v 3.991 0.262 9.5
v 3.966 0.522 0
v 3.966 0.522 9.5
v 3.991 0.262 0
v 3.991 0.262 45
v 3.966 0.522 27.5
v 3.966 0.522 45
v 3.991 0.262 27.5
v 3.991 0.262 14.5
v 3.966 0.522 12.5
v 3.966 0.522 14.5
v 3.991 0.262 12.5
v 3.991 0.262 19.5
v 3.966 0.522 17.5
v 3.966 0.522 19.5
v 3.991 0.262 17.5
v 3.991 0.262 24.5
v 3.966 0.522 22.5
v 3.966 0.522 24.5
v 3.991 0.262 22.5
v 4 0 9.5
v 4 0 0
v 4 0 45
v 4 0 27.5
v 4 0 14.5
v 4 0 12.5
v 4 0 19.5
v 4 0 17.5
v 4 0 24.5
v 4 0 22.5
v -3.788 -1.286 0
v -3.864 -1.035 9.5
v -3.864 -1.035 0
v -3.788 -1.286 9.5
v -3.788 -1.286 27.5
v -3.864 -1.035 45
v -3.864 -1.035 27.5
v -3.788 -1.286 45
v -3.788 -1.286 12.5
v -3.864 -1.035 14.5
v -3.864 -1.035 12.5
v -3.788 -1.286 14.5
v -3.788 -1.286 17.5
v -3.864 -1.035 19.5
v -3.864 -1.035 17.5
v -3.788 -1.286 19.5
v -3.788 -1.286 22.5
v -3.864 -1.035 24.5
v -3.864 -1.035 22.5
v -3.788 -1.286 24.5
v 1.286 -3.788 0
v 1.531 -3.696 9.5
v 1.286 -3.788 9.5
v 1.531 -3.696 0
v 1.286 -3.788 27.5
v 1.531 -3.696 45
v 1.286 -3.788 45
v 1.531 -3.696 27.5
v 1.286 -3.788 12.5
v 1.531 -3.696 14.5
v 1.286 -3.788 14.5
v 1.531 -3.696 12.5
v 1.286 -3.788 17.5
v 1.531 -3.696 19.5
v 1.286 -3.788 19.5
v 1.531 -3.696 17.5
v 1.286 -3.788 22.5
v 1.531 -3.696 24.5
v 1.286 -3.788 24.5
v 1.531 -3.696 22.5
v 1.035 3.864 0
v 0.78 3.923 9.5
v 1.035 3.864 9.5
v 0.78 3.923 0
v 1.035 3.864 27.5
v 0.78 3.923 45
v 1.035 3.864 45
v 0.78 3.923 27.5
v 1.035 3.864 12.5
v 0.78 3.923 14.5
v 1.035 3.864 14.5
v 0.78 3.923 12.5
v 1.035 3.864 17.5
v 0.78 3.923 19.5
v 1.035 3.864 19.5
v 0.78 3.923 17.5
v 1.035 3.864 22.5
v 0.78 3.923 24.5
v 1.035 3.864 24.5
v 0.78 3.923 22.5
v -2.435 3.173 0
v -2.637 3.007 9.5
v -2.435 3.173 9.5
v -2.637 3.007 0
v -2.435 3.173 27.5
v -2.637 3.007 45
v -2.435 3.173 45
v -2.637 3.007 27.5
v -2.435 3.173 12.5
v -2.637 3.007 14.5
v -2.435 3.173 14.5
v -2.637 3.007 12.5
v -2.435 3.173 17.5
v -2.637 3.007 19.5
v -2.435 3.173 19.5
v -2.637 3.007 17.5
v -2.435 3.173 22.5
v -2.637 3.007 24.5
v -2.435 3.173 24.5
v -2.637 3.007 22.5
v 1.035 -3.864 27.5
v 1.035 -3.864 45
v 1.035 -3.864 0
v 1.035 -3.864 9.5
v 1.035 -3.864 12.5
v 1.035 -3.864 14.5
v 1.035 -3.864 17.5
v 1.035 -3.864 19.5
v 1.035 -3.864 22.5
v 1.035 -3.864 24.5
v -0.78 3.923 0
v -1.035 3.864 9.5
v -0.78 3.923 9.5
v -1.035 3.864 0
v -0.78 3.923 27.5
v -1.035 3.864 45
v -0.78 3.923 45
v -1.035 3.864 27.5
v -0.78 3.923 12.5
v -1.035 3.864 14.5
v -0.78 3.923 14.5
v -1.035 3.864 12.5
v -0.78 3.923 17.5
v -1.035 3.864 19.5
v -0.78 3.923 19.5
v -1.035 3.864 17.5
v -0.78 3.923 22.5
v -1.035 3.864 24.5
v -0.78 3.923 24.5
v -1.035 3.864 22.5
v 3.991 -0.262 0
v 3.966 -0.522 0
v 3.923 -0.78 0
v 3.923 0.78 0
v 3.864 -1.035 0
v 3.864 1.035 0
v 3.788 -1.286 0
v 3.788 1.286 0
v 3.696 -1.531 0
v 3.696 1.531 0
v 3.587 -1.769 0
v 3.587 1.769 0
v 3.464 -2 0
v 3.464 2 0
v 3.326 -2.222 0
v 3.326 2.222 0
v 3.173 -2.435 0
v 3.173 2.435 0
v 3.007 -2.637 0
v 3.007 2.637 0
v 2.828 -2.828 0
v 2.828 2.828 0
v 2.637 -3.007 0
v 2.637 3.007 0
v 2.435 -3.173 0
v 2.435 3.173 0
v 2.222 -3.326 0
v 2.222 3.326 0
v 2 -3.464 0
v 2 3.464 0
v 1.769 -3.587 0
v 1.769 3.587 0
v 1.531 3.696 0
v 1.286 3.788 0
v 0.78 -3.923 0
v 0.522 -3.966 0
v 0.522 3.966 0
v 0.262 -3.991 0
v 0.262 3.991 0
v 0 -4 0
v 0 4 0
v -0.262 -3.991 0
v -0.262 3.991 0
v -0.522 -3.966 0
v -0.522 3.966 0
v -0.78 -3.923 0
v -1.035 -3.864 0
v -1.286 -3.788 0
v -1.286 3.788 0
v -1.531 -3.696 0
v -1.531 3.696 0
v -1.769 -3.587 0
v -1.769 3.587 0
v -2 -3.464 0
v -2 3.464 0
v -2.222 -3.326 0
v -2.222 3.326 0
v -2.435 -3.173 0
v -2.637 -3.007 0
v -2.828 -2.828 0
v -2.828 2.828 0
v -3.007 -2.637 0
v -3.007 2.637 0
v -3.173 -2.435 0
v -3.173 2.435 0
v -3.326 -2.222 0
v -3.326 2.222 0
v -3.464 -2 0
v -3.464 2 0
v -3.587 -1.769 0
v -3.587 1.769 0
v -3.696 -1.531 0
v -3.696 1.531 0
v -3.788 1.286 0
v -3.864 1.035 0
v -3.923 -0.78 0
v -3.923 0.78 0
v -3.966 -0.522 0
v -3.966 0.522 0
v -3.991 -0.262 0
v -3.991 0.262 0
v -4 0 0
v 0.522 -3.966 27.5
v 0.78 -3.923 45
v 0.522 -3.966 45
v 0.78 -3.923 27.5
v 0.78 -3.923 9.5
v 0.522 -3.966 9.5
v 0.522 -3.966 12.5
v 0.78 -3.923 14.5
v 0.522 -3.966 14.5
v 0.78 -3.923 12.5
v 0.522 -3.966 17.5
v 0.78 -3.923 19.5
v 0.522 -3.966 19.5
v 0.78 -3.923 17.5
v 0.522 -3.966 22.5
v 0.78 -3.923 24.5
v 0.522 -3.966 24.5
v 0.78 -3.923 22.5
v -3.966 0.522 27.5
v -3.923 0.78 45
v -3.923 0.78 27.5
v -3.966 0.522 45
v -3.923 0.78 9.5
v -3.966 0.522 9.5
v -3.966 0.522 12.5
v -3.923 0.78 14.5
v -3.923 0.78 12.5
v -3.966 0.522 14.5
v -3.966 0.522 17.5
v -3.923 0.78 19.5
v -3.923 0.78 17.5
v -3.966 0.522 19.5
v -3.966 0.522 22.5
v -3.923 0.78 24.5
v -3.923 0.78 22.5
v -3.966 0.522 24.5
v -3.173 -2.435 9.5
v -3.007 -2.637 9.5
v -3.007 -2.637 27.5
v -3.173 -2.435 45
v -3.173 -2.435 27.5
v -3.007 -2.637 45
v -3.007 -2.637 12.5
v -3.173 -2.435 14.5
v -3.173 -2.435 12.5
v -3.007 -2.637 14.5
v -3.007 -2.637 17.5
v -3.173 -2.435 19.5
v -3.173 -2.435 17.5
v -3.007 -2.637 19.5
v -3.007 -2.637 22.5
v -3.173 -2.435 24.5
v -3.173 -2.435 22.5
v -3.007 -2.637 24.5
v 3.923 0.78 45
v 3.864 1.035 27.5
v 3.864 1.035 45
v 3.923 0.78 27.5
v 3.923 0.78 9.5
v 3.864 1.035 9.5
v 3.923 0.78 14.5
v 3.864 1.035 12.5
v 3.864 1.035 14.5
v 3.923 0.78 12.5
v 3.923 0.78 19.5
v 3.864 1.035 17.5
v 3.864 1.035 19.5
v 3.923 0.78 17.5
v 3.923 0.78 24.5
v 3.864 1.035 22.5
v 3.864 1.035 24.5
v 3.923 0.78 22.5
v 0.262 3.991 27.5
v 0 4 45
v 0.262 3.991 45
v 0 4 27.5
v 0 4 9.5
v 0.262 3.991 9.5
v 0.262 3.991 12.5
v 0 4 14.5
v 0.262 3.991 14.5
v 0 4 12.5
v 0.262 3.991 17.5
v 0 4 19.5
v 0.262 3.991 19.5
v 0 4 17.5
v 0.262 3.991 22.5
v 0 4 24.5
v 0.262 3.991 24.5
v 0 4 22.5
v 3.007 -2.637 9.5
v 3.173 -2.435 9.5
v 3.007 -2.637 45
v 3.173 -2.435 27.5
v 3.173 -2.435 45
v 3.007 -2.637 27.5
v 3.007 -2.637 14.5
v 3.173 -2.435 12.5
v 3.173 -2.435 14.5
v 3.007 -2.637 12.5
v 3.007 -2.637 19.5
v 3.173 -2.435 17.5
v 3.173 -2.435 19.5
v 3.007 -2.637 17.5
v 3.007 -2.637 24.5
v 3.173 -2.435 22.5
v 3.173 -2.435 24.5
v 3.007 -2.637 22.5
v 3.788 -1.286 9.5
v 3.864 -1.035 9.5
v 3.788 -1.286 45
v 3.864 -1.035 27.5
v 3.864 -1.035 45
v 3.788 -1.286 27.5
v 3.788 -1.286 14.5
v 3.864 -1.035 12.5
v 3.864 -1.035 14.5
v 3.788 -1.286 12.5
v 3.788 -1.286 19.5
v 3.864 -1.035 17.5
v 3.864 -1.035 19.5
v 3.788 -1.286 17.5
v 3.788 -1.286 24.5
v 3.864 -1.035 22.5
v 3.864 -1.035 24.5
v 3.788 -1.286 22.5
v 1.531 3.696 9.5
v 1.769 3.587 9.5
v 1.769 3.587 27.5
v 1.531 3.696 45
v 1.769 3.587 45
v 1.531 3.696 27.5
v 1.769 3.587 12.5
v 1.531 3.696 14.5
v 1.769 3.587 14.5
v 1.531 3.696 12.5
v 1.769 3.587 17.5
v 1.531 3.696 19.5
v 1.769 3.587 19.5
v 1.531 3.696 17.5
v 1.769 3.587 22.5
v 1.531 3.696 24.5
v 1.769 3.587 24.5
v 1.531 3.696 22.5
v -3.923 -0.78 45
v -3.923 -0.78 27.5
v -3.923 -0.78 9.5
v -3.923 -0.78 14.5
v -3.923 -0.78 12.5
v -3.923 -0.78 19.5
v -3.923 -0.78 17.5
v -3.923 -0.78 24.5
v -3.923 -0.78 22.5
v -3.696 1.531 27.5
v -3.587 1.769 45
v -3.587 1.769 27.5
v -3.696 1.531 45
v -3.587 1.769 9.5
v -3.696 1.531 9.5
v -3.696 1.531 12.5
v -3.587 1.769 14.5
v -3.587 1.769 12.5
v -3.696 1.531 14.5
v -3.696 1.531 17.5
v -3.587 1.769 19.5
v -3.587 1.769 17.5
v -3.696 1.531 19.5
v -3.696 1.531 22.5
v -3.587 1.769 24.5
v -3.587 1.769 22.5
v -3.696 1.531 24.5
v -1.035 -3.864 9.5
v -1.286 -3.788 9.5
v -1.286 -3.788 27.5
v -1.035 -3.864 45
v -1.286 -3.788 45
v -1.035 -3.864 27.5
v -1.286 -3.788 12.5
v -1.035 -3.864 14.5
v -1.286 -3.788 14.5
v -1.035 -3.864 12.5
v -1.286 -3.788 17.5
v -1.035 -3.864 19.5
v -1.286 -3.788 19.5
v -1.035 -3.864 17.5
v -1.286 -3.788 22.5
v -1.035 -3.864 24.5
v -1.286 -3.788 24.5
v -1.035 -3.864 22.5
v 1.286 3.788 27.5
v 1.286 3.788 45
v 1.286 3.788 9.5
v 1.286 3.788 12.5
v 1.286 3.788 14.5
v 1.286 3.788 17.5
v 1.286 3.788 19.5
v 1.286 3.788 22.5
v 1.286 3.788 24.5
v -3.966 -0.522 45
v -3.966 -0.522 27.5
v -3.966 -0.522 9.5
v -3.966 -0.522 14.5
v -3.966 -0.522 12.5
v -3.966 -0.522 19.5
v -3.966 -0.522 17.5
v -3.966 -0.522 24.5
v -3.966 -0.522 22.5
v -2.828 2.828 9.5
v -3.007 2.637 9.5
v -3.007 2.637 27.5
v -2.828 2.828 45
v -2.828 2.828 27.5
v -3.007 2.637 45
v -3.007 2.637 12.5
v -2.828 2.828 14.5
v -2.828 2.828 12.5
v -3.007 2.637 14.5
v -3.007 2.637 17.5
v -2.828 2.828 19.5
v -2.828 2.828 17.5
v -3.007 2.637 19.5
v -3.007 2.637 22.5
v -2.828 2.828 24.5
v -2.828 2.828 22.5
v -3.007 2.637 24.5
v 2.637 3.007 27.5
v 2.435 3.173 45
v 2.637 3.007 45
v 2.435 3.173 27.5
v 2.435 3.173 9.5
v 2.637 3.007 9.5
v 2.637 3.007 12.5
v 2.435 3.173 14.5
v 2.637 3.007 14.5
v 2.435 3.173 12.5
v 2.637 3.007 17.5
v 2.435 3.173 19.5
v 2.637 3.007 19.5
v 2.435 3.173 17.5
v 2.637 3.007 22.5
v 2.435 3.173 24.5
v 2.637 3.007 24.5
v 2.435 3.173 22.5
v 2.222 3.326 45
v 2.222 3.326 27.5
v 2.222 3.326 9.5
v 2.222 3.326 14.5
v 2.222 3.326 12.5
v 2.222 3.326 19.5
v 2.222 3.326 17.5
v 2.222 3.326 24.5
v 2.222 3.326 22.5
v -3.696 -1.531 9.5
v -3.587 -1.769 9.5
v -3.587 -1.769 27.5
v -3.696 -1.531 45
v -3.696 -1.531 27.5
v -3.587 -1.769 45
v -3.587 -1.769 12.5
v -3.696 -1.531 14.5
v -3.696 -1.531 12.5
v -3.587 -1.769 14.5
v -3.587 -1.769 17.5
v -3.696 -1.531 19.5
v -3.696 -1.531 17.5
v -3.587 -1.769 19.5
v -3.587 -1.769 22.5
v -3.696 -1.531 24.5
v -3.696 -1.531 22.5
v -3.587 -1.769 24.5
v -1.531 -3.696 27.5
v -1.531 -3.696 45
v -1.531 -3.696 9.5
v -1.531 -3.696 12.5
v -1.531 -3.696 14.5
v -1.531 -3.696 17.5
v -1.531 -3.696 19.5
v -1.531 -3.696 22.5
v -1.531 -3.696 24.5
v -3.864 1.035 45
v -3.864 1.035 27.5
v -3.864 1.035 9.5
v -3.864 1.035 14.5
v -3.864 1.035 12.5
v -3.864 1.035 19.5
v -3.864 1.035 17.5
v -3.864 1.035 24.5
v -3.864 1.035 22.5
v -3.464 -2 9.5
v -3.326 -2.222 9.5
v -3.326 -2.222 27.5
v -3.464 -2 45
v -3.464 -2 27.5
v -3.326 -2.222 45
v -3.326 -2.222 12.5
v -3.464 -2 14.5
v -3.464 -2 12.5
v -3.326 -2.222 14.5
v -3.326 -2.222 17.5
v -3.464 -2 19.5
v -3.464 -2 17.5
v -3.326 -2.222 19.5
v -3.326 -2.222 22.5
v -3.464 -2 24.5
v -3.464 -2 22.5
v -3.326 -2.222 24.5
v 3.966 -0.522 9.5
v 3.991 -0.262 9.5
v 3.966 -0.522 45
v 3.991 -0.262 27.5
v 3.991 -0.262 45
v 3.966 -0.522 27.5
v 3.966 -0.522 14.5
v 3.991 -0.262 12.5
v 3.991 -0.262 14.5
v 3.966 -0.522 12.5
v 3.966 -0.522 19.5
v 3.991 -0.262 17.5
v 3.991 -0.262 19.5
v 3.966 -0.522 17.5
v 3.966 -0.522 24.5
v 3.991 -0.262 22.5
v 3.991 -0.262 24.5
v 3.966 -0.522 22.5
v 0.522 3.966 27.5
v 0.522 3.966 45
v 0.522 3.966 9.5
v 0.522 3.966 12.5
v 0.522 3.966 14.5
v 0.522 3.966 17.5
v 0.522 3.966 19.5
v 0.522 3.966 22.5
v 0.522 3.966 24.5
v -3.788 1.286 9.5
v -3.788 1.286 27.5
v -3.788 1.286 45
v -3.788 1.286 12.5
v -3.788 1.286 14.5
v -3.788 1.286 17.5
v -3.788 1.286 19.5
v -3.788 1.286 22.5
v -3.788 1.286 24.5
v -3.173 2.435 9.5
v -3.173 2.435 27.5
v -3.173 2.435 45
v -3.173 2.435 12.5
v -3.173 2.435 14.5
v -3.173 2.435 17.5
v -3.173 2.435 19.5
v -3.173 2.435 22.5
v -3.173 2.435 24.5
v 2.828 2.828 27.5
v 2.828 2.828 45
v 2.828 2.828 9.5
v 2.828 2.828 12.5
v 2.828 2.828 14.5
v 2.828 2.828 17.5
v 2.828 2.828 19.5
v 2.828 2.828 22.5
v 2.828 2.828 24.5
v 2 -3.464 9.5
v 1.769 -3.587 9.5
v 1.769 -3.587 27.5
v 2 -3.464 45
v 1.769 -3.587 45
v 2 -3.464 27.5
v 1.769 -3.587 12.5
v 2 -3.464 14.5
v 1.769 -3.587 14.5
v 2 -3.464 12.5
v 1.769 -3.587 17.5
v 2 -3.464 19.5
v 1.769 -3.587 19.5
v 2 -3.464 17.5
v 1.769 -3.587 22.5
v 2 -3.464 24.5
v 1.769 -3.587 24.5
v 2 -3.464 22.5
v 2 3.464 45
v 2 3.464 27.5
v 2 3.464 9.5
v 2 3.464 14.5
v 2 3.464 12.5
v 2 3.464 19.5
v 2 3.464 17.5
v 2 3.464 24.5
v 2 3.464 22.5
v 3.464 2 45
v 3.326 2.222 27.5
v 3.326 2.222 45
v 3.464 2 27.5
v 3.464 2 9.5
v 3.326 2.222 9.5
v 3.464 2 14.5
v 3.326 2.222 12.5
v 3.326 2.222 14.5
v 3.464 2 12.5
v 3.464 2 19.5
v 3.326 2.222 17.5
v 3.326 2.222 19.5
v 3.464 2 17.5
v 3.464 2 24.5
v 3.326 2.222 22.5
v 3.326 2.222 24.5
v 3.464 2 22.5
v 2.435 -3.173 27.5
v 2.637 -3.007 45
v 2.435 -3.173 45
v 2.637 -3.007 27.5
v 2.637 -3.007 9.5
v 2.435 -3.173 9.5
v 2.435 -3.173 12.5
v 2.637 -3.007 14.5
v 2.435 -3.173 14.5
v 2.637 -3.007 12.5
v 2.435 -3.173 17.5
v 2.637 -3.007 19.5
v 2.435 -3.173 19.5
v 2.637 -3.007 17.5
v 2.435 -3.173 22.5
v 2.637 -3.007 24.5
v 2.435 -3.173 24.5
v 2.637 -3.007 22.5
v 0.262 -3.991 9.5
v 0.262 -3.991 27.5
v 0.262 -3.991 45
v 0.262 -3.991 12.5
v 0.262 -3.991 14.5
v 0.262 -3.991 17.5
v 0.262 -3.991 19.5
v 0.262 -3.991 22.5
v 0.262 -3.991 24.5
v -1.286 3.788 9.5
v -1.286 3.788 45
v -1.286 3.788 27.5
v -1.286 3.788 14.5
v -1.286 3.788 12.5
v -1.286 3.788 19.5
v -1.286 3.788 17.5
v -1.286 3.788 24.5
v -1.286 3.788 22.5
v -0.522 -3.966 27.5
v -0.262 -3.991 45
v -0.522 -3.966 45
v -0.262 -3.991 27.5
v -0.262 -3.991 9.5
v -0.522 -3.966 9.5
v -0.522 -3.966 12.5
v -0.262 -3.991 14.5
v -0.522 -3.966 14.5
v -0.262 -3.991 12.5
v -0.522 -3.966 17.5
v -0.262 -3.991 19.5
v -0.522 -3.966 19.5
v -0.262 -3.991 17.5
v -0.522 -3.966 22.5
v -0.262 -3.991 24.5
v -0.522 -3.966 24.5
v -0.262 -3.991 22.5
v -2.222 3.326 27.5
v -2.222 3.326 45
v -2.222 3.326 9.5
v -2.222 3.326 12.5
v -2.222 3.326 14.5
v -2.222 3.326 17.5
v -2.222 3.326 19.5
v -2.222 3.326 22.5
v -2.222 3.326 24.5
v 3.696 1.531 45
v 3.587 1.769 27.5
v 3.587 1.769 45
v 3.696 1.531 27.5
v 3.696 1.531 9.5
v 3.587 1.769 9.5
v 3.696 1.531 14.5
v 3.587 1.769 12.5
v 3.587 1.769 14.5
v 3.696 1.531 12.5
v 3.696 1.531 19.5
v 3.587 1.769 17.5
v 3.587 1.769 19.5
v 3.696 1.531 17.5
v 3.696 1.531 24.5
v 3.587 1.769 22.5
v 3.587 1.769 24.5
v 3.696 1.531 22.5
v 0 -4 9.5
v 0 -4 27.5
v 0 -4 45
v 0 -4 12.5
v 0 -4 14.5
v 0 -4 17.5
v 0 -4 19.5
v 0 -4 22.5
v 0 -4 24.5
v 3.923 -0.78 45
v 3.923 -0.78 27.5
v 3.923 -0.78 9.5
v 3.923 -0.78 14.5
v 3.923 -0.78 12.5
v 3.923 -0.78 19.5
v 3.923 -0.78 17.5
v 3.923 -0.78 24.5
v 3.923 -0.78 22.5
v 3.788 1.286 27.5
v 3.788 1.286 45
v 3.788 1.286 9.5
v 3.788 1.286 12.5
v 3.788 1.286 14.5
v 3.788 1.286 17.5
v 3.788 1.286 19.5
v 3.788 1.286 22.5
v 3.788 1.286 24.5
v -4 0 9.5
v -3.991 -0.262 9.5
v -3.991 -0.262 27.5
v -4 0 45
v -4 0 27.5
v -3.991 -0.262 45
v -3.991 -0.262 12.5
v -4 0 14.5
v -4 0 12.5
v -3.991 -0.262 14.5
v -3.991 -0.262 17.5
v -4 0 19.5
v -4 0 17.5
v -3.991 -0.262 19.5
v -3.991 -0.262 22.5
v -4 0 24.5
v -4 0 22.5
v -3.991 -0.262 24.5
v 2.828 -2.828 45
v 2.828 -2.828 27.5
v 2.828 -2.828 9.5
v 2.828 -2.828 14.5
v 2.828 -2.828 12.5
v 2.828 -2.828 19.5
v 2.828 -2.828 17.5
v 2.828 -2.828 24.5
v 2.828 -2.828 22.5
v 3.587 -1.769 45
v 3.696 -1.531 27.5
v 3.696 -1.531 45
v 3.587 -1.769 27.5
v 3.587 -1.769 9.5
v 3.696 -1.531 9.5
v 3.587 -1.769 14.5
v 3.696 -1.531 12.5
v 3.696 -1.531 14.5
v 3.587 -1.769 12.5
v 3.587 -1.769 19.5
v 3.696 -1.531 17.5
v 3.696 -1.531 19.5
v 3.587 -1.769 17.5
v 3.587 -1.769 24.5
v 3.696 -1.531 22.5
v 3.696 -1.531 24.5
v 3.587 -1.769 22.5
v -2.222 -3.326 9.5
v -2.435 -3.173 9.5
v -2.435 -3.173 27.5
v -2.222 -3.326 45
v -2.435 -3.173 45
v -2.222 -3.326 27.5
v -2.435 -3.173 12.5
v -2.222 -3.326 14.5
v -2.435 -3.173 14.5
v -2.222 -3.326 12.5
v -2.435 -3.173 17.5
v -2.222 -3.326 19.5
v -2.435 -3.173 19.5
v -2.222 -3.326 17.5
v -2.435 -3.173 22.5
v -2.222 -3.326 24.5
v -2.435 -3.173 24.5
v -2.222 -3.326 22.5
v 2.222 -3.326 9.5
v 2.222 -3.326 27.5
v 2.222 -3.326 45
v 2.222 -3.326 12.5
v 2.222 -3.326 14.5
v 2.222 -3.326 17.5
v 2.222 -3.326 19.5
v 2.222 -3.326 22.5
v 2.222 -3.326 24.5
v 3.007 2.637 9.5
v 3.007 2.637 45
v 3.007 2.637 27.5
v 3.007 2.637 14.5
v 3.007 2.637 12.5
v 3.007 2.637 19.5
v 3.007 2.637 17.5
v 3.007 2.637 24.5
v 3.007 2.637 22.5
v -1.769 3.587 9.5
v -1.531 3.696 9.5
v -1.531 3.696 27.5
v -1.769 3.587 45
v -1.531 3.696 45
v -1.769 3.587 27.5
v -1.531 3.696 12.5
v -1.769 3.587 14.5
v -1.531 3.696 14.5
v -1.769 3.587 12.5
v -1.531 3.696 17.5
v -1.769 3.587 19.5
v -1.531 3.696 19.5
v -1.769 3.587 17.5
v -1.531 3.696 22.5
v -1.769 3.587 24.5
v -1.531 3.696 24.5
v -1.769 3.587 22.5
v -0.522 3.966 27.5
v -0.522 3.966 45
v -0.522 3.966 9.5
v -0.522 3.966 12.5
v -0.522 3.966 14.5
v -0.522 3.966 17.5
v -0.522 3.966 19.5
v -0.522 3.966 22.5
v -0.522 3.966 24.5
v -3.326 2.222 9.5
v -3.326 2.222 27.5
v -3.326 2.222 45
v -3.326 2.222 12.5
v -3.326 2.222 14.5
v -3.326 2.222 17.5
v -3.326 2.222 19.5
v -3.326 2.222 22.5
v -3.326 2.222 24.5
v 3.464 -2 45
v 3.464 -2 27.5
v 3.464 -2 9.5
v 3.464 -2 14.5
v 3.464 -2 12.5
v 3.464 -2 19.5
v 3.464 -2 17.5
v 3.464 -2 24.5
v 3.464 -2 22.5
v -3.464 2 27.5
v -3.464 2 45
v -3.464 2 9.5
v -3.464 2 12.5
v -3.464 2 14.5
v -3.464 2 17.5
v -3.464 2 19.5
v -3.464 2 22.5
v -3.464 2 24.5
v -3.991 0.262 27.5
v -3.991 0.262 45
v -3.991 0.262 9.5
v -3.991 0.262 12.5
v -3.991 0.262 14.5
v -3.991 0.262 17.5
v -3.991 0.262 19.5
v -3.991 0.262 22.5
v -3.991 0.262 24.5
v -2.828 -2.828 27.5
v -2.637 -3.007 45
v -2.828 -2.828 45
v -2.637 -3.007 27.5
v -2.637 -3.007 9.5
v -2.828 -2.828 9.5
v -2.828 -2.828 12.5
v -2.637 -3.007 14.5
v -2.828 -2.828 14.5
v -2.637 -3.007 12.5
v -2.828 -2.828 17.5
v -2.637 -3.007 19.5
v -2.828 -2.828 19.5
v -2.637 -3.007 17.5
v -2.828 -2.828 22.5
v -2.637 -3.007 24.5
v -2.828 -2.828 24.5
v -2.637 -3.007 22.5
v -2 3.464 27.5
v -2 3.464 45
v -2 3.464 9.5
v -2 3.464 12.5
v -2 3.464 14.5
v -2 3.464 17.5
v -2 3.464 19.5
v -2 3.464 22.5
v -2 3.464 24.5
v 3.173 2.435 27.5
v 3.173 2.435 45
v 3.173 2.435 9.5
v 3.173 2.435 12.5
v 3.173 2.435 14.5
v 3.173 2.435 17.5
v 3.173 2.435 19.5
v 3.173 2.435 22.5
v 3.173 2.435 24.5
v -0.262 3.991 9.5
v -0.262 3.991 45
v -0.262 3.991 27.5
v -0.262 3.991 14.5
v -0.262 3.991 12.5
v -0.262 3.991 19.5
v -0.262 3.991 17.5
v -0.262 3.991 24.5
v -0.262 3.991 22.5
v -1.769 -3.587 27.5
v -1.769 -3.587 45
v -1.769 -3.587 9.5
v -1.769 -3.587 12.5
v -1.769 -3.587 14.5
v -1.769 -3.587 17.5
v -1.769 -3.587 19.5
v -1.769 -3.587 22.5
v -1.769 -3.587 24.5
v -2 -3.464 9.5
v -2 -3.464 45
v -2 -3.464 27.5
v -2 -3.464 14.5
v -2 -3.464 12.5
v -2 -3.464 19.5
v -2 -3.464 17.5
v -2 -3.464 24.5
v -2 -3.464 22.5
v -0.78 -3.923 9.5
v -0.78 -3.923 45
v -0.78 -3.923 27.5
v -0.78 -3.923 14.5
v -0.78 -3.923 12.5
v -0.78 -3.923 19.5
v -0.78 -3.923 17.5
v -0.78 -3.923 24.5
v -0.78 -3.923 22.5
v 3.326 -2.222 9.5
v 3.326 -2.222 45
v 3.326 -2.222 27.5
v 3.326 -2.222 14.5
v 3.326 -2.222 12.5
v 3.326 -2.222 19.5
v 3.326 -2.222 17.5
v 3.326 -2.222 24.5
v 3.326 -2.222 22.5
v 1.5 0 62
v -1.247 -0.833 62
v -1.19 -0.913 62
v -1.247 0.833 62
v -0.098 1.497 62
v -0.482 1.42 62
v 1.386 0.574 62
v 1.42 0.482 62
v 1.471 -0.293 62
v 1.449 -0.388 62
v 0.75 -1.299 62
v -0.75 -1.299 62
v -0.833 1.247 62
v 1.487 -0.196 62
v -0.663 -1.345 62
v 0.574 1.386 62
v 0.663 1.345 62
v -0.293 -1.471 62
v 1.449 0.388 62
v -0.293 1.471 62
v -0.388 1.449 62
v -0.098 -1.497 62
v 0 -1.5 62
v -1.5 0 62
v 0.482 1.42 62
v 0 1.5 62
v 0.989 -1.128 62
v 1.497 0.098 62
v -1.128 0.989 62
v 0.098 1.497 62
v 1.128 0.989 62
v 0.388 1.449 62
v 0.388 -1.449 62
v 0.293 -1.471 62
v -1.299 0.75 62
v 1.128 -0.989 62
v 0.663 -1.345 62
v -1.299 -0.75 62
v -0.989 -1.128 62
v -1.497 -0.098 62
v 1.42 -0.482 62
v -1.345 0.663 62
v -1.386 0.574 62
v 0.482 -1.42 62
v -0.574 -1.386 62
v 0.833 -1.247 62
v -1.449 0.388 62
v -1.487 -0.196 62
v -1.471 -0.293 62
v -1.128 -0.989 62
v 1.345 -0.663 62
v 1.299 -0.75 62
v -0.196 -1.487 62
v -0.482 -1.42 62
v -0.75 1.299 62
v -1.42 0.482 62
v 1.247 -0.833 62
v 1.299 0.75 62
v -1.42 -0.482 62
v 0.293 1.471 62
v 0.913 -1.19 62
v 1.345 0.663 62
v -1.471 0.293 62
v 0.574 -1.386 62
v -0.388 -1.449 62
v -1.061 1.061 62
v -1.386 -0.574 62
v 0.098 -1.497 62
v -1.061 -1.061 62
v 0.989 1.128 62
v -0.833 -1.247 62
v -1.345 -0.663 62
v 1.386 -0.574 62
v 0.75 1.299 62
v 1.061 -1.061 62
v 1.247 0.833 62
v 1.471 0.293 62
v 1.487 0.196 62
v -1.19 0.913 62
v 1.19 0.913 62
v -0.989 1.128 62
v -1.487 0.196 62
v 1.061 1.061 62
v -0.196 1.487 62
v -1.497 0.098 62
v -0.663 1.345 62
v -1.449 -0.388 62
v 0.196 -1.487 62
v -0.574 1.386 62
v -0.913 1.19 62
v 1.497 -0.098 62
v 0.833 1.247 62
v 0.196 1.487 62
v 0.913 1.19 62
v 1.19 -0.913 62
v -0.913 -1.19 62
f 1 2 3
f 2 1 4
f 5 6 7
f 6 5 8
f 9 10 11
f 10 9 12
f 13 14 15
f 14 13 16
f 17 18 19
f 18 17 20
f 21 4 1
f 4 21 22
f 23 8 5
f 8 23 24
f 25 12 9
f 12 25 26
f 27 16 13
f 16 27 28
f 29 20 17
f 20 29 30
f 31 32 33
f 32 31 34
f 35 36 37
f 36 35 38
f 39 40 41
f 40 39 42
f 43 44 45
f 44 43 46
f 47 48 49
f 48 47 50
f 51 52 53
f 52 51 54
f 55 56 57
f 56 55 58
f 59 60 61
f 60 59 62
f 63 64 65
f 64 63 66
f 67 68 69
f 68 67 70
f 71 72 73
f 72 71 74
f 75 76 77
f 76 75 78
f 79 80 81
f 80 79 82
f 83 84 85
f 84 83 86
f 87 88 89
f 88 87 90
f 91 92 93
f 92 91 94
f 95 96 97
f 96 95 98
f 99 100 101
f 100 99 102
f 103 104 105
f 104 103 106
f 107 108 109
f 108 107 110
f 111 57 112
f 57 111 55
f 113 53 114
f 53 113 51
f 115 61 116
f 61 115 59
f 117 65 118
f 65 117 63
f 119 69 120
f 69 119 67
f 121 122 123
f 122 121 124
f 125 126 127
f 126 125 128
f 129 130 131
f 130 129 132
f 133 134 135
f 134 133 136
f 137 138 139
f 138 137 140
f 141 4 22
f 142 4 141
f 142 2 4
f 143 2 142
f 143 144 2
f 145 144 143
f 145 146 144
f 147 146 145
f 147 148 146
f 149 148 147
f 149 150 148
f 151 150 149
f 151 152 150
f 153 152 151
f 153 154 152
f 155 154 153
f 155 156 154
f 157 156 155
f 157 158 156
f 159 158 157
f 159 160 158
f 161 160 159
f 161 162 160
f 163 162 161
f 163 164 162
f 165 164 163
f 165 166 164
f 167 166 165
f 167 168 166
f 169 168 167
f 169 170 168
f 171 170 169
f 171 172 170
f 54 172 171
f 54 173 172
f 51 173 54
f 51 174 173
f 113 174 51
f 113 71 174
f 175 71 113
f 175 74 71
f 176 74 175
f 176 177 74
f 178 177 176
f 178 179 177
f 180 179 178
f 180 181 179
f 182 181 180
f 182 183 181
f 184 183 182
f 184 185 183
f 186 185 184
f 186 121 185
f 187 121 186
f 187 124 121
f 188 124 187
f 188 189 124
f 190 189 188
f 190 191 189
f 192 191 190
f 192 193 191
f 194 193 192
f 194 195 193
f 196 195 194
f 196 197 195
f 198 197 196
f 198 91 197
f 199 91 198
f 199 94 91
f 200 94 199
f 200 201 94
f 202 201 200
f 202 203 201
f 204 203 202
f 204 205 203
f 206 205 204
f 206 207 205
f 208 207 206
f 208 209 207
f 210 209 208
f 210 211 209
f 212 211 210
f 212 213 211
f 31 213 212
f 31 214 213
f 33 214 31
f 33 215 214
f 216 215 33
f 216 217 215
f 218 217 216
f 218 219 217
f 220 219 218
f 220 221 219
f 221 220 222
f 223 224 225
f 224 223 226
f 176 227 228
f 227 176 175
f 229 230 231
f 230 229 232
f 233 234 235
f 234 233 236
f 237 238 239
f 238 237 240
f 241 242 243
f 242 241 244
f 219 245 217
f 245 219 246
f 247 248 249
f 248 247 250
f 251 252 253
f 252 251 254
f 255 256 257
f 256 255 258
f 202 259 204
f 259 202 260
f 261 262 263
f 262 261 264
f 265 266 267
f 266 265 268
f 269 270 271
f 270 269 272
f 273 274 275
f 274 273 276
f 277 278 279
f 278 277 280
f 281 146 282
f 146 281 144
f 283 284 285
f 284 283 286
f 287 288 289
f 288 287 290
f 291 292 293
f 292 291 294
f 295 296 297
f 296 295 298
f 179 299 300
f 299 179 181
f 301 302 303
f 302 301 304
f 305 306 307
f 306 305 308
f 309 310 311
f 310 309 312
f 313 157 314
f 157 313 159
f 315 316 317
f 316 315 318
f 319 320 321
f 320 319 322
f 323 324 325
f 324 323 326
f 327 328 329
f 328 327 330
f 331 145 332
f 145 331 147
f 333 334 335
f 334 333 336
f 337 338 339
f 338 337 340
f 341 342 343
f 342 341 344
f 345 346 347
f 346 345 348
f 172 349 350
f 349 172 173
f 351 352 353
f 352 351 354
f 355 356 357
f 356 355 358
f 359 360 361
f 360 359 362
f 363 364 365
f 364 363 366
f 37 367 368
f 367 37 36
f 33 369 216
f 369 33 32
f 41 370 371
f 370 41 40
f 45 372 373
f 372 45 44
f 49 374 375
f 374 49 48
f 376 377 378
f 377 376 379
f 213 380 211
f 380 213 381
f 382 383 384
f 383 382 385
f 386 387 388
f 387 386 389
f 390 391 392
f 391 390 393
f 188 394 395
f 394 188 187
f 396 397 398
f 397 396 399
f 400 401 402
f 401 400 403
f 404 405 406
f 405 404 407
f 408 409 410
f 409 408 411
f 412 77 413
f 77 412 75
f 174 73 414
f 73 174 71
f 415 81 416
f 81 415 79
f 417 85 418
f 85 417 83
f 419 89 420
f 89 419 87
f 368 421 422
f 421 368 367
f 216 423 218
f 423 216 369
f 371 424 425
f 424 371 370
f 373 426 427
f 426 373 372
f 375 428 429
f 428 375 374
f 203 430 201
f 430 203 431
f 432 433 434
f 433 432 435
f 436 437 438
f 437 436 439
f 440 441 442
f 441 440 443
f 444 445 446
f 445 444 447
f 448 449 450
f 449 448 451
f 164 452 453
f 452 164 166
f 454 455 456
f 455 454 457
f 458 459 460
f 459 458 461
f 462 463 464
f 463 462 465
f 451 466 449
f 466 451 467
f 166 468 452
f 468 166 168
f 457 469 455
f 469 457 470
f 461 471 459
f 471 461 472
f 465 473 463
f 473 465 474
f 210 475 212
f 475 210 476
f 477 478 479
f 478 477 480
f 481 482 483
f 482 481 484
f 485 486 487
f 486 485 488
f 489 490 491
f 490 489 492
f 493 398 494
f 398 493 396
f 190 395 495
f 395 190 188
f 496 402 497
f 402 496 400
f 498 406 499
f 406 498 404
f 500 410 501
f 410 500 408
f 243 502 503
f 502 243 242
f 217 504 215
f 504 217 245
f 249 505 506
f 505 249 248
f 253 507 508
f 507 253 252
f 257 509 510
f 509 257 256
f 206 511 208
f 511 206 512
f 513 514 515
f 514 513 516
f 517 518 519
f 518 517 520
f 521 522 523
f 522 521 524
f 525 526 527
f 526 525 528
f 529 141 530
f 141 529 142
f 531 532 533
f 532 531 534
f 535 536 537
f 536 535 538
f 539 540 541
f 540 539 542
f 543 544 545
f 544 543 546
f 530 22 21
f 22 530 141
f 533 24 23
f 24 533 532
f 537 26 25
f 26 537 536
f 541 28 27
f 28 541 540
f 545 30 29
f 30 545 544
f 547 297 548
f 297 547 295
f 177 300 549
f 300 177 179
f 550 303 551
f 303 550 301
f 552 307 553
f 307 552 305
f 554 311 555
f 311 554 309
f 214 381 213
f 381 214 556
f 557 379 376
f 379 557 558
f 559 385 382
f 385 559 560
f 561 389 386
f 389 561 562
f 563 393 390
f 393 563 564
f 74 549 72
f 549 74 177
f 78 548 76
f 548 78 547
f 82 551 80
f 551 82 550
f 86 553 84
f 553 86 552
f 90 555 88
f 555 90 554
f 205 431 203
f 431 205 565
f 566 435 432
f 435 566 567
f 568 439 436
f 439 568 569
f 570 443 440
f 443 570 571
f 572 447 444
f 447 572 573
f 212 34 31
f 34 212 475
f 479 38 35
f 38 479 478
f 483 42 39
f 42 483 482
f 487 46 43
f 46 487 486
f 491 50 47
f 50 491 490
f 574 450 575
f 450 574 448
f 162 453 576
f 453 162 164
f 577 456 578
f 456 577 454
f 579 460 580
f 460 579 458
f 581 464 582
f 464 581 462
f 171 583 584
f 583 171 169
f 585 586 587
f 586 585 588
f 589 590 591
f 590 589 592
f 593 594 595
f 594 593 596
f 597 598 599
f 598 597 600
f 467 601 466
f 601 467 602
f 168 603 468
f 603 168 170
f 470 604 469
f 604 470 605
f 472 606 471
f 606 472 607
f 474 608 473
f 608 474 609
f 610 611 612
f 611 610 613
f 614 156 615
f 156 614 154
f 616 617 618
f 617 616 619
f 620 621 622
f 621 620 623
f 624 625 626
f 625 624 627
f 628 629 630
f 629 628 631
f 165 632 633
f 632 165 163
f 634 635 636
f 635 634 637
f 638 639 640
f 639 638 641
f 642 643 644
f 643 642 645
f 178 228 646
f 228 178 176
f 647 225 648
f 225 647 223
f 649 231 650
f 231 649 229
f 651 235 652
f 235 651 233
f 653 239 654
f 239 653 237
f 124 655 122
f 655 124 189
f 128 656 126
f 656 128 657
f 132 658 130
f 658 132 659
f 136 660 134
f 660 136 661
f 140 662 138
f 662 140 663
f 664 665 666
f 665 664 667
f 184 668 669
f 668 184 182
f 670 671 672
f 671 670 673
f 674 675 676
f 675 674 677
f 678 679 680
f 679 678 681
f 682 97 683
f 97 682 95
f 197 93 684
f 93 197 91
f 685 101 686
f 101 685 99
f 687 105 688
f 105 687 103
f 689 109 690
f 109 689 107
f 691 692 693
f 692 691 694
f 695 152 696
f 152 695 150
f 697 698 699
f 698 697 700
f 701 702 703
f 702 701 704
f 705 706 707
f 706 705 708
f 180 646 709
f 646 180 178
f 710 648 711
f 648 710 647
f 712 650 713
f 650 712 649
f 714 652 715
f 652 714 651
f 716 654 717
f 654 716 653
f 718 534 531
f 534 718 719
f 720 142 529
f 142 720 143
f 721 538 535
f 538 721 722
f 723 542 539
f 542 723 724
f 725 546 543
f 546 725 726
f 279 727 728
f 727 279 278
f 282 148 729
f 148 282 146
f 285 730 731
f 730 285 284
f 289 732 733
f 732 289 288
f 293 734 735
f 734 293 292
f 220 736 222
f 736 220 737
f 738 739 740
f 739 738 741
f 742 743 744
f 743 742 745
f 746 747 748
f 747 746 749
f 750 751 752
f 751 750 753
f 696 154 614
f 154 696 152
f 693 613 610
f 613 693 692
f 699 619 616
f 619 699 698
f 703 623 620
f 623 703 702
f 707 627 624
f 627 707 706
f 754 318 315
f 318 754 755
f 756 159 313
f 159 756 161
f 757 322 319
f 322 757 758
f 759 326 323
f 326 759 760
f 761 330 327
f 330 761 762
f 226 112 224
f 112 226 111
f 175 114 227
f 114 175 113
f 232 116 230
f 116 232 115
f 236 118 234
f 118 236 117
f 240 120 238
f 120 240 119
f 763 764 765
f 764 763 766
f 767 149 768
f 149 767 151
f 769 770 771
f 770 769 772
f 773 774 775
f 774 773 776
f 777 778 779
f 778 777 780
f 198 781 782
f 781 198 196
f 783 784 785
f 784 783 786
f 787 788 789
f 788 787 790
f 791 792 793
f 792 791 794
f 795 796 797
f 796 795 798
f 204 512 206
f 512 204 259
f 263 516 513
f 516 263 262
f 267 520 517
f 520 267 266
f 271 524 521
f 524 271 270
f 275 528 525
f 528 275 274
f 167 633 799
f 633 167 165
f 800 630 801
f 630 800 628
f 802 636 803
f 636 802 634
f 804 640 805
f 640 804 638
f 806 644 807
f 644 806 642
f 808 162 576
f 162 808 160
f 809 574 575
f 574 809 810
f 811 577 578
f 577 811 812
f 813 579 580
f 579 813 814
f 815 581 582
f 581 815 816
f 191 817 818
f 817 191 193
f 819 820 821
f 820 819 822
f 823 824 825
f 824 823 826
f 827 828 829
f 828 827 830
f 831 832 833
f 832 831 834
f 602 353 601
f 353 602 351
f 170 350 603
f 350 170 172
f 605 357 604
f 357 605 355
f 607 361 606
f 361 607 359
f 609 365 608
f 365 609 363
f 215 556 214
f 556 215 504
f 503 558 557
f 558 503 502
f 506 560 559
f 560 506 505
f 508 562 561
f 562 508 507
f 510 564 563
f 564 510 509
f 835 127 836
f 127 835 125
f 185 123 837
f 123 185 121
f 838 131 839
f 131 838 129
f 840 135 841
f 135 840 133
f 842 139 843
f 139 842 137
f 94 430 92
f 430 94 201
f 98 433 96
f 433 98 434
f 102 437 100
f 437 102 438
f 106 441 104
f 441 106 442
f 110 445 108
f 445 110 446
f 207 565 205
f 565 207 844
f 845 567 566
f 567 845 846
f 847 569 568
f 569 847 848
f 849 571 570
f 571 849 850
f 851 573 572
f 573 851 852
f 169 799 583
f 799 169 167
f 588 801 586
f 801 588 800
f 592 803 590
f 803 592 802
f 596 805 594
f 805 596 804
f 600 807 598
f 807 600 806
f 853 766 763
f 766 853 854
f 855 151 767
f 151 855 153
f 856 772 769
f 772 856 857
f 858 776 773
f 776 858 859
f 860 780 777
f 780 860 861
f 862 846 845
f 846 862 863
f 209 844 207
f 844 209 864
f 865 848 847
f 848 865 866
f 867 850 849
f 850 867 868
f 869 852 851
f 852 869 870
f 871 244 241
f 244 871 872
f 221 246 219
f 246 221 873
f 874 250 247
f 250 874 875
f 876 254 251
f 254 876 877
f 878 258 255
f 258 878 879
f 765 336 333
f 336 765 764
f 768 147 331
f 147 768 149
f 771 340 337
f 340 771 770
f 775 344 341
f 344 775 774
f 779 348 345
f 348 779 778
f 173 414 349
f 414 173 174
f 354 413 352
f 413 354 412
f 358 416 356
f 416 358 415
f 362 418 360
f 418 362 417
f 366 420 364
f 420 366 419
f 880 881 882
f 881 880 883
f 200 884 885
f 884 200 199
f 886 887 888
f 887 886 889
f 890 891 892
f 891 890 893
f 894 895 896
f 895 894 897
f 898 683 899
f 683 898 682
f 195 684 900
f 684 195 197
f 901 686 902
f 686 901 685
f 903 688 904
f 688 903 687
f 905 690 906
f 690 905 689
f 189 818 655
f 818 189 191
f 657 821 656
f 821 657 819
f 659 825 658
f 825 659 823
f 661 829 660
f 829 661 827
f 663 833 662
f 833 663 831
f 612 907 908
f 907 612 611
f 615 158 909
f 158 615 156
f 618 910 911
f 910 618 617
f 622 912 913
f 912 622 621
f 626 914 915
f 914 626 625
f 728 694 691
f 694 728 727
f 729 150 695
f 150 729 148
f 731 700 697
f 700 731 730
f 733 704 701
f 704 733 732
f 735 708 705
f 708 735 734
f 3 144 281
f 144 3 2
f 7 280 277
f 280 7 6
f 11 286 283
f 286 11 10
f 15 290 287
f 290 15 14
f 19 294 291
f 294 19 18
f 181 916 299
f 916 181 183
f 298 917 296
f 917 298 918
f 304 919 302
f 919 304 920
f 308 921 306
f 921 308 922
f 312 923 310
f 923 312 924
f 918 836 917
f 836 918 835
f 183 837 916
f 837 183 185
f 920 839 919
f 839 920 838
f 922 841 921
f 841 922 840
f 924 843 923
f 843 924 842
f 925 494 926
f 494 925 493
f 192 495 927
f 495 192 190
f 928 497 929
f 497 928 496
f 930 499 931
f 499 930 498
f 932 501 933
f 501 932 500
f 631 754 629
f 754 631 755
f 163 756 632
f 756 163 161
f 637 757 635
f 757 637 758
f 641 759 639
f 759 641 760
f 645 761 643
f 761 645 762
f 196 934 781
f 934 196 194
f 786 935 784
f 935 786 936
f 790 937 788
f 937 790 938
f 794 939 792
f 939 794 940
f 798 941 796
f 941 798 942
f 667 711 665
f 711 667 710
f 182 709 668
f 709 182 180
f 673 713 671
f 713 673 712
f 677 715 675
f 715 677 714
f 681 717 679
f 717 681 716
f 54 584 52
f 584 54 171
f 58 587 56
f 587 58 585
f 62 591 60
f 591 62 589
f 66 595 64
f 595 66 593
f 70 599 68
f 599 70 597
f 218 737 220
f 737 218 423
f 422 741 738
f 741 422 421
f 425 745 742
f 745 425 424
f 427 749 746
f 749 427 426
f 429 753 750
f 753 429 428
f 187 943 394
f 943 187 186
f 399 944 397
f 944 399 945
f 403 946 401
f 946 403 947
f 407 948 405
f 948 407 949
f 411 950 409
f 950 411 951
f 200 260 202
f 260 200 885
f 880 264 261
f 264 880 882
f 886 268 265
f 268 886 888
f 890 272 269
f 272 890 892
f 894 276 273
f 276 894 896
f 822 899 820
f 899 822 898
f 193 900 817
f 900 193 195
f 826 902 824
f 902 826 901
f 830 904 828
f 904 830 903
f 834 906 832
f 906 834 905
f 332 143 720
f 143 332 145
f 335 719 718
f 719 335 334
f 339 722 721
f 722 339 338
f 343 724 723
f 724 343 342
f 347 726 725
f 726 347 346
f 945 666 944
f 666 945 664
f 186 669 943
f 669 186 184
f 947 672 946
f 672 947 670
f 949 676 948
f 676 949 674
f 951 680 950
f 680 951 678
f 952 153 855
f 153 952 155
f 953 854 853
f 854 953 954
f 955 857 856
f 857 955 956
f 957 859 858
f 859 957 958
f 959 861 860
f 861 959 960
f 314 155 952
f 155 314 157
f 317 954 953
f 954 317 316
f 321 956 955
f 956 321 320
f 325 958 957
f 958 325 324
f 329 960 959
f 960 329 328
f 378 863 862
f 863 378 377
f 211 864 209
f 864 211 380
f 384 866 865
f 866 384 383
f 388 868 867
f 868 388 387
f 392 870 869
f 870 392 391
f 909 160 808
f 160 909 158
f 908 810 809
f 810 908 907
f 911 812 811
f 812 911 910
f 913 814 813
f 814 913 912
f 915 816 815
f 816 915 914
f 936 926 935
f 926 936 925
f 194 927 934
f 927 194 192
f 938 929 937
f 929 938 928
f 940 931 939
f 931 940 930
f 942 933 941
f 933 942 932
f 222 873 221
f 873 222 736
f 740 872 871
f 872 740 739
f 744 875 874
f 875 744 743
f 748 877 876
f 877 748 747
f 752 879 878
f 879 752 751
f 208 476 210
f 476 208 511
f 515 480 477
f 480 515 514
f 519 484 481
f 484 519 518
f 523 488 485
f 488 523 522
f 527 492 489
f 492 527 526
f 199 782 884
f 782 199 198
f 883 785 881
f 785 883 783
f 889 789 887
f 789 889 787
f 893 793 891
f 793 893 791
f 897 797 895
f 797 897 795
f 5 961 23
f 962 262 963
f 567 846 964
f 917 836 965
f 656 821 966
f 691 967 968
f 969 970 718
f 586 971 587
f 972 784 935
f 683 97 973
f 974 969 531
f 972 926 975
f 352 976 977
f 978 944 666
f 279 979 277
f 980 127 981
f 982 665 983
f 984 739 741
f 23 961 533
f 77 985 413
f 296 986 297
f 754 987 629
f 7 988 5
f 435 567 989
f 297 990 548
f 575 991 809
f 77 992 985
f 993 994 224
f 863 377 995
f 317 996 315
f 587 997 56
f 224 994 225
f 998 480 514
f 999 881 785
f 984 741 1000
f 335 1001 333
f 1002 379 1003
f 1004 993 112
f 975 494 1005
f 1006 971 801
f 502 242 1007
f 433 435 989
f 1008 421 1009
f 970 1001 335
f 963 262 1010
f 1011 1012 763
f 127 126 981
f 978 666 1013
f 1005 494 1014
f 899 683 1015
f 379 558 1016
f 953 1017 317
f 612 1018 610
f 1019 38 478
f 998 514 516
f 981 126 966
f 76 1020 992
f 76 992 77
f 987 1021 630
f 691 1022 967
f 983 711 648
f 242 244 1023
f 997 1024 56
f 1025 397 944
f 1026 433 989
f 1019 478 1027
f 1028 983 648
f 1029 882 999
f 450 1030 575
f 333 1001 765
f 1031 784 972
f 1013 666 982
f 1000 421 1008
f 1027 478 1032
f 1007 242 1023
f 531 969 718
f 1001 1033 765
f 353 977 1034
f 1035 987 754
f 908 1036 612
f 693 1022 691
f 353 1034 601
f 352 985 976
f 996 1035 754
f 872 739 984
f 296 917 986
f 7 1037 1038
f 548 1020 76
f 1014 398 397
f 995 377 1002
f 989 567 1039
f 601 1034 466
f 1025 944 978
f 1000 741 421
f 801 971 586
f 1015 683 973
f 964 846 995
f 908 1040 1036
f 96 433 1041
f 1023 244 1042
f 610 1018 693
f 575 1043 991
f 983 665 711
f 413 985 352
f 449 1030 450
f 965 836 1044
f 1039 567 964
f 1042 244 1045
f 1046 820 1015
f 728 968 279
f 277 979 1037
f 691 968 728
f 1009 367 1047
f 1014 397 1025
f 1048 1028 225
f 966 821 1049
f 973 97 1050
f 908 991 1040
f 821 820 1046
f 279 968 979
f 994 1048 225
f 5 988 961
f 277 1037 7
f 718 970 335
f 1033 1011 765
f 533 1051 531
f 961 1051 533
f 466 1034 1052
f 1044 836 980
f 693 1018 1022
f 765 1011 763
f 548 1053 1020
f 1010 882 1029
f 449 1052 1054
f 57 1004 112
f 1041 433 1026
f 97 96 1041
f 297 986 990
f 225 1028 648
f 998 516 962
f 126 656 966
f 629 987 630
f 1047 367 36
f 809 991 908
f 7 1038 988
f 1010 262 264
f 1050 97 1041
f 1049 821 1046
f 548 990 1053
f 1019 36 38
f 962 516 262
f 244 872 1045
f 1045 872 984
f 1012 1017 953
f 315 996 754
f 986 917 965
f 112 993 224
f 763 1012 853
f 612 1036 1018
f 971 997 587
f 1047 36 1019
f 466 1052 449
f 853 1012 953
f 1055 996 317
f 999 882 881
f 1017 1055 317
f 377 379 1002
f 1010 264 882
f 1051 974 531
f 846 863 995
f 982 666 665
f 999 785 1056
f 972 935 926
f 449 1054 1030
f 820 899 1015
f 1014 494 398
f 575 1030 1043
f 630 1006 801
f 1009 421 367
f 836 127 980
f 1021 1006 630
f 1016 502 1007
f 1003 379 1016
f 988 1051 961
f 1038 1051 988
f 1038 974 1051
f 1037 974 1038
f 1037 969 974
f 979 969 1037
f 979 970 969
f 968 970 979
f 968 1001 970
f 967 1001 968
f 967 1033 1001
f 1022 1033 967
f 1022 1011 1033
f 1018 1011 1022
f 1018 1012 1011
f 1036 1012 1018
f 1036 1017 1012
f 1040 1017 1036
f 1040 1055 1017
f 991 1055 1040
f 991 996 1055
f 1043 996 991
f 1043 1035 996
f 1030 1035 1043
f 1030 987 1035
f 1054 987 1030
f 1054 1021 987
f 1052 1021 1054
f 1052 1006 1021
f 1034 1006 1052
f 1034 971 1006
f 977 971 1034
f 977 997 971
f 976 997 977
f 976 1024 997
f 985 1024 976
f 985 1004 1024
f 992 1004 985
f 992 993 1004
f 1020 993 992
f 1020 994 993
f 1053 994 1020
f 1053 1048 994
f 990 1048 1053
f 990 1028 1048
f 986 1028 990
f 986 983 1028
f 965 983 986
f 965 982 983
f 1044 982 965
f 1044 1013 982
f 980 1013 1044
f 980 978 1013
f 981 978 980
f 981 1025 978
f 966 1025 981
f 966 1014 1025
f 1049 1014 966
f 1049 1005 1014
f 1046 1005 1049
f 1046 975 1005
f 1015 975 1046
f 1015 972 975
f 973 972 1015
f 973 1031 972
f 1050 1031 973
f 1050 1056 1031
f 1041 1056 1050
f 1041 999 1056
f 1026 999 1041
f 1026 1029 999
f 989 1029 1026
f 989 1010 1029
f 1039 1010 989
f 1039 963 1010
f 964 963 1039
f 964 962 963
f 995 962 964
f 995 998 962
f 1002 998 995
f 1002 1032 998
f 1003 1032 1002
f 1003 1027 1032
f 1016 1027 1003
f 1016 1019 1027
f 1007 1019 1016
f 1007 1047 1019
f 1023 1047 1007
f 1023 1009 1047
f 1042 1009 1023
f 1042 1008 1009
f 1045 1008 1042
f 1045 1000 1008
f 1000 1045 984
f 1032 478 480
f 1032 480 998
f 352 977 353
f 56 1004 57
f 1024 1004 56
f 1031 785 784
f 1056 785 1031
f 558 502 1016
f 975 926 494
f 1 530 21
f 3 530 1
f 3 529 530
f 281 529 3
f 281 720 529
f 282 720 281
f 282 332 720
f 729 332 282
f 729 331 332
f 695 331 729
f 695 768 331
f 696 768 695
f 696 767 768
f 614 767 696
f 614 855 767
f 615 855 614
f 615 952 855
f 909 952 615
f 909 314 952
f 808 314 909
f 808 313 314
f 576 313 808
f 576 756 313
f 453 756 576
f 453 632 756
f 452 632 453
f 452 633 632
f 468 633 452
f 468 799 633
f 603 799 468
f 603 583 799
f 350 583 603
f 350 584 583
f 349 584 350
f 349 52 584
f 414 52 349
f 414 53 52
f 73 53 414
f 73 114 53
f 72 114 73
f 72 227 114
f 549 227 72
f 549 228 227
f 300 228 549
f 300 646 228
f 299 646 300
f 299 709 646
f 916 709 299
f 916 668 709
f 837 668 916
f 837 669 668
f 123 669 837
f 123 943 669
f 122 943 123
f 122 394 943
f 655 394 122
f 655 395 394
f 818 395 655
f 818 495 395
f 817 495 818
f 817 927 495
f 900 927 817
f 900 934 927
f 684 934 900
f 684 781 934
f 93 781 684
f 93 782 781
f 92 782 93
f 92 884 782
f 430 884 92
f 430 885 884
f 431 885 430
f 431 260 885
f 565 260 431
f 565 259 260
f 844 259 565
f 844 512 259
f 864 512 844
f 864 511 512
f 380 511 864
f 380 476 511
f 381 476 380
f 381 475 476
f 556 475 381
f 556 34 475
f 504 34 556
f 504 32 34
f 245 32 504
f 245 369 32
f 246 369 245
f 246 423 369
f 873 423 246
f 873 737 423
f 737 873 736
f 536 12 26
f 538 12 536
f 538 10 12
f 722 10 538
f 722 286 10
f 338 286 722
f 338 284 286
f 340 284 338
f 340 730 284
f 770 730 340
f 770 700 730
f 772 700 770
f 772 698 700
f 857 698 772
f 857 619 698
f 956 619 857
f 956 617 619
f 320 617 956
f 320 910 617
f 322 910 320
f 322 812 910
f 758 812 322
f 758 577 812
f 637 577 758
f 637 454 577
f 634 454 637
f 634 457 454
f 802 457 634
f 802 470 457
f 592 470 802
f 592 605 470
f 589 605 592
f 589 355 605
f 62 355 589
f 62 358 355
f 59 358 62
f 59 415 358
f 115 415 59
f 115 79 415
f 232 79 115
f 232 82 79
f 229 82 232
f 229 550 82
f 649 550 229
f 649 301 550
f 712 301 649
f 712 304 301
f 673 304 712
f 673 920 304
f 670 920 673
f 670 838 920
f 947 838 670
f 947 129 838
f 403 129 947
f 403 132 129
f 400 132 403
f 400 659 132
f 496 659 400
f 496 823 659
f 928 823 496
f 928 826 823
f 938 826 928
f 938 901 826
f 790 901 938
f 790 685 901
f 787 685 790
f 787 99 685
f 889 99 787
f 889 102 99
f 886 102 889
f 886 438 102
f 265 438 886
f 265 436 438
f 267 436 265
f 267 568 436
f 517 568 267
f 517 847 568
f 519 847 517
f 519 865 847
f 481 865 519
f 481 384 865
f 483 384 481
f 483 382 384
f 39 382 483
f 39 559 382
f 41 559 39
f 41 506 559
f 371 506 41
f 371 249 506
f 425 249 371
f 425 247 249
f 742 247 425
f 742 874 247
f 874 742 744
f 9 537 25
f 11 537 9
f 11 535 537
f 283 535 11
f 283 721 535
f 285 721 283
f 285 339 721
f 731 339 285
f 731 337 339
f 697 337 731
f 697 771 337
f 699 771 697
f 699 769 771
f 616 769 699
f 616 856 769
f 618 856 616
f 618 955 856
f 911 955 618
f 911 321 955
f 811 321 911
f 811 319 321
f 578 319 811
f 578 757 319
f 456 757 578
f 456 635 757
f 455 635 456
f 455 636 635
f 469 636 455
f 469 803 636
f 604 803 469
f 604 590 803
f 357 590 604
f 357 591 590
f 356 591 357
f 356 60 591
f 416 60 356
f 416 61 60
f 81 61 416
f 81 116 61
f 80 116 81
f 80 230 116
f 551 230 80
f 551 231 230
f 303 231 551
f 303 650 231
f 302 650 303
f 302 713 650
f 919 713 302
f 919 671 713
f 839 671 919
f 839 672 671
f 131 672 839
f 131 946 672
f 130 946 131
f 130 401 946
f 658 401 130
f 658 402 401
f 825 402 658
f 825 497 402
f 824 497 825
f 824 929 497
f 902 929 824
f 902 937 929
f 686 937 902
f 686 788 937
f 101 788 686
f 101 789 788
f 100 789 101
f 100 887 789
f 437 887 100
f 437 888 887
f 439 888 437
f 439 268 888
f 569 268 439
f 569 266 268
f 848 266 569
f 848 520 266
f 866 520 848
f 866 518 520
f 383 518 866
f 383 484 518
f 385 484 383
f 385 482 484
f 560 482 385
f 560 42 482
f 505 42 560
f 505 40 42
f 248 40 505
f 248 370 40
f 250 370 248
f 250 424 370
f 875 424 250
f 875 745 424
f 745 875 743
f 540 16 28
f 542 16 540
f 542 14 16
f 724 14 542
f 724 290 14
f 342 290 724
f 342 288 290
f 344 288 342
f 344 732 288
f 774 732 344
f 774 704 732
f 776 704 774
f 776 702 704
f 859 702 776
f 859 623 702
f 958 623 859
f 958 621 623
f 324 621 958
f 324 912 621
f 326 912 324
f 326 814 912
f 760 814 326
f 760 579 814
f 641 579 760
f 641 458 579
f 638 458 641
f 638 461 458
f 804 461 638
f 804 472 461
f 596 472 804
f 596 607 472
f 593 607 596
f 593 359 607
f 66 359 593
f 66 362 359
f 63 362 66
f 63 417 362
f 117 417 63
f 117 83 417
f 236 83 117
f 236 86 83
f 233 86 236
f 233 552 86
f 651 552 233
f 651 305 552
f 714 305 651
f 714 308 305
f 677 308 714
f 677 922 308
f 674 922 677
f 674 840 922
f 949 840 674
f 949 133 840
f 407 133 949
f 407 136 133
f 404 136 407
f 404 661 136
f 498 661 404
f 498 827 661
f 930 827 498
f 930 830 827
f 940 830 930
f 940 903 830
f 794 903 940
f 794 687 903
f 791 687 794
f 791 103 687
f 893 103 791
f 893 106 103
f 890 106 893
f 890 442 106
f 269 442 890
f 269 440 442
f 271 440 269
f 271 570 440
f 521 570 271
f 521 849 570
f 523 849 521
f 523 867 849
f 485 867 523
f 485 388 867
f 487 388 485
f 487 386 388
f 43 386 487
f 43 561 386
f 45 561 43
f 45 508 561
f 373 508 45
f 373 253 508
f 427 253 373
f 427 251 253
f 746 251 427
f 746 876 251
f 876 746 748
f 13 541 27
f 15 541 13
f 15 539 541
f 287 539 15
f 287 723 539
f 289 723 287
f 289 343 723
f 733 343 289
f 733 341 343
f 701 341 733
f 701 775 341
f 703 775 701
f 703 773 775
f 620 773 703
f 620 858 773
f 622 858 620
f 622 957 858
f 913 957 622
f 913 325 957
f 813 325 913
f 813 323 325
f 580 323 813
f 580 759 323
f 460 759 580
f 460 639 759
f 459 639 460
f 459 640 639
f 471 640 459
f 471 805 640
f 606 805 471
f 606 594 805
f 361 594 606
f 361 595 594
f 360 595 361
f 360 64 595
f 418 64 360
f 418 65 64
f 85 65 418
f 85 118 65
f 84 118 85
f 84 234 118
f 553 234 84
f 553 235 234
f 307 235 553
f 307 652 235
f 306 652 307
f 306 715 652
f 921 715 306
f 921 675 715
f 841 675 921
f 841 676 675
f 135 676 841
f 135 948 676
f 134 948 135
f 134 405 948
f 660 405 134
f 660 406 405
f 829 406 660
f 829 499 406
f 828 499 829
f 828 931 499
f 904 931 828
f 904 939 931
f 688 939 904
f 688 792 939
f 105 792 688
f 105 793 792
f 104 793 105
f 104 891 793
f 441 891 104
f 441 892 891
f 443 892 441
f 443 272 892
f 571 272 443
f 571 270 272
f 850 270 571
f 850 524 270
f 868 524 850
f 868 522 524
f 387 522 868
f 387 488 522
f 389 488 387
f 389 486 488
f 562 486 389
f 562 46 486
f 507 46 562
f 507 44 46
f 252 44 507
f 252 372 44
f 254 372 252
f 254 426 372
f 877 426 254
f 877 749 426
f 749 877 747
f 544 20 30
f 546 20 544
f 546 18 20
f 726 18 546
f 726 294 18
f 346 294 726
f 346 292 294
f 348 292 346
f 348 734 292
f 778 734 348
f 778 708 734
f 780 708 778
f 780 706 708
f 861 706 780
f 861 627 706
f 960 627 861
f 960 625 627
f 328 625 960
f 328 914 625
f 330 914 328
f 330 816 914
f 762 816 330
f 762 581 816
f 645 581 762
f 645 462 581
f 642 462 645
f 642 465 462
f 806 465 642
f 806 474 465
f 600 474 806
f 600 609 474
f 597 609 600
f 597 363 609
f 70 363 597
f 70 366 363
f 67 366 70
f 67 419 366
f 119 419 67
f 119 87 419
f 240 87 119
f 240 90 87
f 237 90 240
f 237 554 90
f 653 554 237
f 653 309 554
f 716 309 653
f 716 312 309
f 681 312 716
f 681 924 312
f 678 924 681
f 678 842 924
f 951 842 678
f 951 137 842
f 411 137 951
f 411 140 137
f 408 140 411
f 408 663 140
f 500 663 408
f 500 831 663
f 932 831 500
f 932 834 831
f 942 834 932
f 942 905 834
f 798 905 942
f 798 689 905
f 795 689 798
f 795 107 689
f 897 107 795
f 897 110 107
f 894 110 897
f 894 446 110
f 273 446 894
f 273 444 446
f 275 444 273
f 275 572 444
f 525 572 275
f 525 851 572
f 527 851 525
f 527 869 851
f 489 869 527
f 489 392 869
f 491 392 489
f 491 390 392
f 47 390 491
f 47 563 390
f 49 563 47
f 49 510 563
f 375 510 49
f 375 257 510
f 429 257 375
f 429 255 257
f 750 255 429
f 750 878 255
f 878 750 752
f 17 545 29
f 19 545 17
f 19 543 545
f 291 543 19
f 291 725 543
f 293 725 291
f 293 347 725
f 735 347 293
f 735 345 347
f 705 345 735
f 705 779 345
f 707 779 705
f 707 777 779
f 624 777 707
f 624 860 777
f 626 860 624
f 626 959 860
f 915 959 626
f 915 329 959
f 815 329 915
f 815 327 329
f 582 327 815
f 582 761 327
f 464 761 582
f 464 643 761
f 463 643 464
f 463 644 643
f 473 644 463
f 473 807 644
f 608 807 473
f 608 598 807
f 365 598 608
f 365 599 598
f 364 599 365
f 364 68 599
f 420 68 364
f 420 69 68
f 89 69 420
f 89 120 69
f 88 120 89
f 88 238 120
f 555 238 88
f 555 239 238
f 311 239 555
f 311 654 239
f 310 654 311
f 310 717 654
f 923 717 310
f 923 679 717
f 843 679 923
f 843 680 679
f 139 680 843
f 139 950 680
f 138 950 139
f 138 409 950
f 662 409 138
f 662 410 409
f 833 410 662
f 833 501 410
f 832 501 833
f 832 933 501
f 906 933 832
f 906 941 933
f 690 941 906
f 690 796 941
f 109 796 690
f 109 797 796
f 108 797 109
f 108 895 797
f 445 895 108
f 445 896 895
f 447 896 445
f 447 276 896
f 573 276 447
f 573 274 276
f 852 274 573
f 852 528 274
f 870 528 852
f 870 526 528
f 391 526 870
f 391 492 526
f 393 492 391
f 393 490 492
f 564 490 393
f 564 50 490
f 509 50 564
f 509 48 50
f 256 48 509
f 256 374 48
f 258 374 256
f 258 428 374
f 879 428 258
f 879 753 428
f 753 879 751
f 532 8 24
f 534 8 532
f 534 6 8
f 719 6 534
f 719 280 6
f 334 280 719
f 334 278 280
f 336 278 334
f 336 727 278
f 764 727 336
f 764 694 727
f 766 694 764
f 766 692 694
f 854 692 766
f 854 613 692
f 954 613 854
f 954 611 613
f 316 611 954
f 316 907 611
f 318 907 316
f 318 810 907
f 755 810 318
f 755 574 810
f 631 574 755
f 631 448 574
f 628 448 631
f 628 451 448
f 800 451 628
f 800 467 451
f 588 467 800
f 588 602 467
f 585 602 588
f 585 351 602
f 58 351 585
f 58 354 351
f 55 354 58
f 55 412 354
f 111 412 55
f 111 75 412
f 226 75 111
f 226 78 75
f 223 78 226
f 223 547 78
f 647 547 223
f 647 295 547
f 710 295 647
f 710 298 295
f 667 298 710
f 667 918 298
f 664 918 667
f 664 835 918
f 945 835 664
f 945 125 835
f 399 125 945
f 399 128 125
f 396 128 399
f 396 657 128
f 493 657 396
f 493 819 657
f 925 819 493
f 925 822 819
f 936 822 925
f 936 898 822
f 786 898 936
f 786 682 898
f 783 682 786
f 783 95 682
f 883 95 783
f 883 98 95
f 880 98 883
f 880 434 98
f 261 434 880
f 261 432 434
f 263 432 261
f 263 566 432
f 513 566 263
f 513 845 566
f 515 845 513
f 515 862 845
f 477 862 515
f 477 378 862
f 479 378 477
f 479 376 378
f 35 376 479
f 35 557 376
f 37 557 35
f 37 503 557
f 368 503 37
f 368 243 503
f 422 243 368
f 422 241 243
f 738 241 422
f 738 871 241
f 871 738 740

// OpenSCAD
// Pestle for grinding tissue inside a 1.5 mL microcentrifuge tube
// Print orientation: standing upright, handle at the bottom

// ---------------- Parameters ----------------
handle_d      = 8;     // handle diameter (mm)
handle_h      = 45;    // handle height, z = 0 to 45 (mm)

cone_top_d    = 8;     // cone top diameter at z = 45 (mm)
cone_bottom_d = 3;     // cone bottom diameter at z = 62 (mm)
cone_h        = 17;    // cone height, z = 45 to 62 (mm)

tip_d         = 3;     // tip sphere diameter (mm)
tip_z         = 62;    // tip sphere centre height (mm)

groove_w      = 2;     // groove width in Z (mm)
groove_depth  = 1;     // groove depth from surface (mm)
groove_z      = [10, 15, 20, 25]; // groove centre heights (mm)

overcut       = 0.5;   // extra length of cutters past faces (mm)
$fn           = 96;    // curve resolution

// ---------------- Model ----------------
difference() {
    union() {
        // Handle: cylinder from z = 0 to 45
        cylinder(d = handle_d, h = handle_h);

        // Cone: tapers from 8 mm at z = 45 to 3 mm at z = 62
        translate([0, 0, handle_h])
            cylinder(d1 = cone_top_d, d2 = cone_bottom_d, h = cone_h);

        // Rounded tip: 3 mm diameter sphere centred at z = 62
        translate([0, 0, tip_z - tip_d / 2])
            sphere(d = tip_d);
    }

    // Grip grooves: circumferential cuts into the handle
    for (z = groove_z)
        translate([0, 0, z - overcut])
            cylinder(d = handle_d + 2 * groove_depth, h = groove_w + 2 * overcut, $fn = 64);
}
